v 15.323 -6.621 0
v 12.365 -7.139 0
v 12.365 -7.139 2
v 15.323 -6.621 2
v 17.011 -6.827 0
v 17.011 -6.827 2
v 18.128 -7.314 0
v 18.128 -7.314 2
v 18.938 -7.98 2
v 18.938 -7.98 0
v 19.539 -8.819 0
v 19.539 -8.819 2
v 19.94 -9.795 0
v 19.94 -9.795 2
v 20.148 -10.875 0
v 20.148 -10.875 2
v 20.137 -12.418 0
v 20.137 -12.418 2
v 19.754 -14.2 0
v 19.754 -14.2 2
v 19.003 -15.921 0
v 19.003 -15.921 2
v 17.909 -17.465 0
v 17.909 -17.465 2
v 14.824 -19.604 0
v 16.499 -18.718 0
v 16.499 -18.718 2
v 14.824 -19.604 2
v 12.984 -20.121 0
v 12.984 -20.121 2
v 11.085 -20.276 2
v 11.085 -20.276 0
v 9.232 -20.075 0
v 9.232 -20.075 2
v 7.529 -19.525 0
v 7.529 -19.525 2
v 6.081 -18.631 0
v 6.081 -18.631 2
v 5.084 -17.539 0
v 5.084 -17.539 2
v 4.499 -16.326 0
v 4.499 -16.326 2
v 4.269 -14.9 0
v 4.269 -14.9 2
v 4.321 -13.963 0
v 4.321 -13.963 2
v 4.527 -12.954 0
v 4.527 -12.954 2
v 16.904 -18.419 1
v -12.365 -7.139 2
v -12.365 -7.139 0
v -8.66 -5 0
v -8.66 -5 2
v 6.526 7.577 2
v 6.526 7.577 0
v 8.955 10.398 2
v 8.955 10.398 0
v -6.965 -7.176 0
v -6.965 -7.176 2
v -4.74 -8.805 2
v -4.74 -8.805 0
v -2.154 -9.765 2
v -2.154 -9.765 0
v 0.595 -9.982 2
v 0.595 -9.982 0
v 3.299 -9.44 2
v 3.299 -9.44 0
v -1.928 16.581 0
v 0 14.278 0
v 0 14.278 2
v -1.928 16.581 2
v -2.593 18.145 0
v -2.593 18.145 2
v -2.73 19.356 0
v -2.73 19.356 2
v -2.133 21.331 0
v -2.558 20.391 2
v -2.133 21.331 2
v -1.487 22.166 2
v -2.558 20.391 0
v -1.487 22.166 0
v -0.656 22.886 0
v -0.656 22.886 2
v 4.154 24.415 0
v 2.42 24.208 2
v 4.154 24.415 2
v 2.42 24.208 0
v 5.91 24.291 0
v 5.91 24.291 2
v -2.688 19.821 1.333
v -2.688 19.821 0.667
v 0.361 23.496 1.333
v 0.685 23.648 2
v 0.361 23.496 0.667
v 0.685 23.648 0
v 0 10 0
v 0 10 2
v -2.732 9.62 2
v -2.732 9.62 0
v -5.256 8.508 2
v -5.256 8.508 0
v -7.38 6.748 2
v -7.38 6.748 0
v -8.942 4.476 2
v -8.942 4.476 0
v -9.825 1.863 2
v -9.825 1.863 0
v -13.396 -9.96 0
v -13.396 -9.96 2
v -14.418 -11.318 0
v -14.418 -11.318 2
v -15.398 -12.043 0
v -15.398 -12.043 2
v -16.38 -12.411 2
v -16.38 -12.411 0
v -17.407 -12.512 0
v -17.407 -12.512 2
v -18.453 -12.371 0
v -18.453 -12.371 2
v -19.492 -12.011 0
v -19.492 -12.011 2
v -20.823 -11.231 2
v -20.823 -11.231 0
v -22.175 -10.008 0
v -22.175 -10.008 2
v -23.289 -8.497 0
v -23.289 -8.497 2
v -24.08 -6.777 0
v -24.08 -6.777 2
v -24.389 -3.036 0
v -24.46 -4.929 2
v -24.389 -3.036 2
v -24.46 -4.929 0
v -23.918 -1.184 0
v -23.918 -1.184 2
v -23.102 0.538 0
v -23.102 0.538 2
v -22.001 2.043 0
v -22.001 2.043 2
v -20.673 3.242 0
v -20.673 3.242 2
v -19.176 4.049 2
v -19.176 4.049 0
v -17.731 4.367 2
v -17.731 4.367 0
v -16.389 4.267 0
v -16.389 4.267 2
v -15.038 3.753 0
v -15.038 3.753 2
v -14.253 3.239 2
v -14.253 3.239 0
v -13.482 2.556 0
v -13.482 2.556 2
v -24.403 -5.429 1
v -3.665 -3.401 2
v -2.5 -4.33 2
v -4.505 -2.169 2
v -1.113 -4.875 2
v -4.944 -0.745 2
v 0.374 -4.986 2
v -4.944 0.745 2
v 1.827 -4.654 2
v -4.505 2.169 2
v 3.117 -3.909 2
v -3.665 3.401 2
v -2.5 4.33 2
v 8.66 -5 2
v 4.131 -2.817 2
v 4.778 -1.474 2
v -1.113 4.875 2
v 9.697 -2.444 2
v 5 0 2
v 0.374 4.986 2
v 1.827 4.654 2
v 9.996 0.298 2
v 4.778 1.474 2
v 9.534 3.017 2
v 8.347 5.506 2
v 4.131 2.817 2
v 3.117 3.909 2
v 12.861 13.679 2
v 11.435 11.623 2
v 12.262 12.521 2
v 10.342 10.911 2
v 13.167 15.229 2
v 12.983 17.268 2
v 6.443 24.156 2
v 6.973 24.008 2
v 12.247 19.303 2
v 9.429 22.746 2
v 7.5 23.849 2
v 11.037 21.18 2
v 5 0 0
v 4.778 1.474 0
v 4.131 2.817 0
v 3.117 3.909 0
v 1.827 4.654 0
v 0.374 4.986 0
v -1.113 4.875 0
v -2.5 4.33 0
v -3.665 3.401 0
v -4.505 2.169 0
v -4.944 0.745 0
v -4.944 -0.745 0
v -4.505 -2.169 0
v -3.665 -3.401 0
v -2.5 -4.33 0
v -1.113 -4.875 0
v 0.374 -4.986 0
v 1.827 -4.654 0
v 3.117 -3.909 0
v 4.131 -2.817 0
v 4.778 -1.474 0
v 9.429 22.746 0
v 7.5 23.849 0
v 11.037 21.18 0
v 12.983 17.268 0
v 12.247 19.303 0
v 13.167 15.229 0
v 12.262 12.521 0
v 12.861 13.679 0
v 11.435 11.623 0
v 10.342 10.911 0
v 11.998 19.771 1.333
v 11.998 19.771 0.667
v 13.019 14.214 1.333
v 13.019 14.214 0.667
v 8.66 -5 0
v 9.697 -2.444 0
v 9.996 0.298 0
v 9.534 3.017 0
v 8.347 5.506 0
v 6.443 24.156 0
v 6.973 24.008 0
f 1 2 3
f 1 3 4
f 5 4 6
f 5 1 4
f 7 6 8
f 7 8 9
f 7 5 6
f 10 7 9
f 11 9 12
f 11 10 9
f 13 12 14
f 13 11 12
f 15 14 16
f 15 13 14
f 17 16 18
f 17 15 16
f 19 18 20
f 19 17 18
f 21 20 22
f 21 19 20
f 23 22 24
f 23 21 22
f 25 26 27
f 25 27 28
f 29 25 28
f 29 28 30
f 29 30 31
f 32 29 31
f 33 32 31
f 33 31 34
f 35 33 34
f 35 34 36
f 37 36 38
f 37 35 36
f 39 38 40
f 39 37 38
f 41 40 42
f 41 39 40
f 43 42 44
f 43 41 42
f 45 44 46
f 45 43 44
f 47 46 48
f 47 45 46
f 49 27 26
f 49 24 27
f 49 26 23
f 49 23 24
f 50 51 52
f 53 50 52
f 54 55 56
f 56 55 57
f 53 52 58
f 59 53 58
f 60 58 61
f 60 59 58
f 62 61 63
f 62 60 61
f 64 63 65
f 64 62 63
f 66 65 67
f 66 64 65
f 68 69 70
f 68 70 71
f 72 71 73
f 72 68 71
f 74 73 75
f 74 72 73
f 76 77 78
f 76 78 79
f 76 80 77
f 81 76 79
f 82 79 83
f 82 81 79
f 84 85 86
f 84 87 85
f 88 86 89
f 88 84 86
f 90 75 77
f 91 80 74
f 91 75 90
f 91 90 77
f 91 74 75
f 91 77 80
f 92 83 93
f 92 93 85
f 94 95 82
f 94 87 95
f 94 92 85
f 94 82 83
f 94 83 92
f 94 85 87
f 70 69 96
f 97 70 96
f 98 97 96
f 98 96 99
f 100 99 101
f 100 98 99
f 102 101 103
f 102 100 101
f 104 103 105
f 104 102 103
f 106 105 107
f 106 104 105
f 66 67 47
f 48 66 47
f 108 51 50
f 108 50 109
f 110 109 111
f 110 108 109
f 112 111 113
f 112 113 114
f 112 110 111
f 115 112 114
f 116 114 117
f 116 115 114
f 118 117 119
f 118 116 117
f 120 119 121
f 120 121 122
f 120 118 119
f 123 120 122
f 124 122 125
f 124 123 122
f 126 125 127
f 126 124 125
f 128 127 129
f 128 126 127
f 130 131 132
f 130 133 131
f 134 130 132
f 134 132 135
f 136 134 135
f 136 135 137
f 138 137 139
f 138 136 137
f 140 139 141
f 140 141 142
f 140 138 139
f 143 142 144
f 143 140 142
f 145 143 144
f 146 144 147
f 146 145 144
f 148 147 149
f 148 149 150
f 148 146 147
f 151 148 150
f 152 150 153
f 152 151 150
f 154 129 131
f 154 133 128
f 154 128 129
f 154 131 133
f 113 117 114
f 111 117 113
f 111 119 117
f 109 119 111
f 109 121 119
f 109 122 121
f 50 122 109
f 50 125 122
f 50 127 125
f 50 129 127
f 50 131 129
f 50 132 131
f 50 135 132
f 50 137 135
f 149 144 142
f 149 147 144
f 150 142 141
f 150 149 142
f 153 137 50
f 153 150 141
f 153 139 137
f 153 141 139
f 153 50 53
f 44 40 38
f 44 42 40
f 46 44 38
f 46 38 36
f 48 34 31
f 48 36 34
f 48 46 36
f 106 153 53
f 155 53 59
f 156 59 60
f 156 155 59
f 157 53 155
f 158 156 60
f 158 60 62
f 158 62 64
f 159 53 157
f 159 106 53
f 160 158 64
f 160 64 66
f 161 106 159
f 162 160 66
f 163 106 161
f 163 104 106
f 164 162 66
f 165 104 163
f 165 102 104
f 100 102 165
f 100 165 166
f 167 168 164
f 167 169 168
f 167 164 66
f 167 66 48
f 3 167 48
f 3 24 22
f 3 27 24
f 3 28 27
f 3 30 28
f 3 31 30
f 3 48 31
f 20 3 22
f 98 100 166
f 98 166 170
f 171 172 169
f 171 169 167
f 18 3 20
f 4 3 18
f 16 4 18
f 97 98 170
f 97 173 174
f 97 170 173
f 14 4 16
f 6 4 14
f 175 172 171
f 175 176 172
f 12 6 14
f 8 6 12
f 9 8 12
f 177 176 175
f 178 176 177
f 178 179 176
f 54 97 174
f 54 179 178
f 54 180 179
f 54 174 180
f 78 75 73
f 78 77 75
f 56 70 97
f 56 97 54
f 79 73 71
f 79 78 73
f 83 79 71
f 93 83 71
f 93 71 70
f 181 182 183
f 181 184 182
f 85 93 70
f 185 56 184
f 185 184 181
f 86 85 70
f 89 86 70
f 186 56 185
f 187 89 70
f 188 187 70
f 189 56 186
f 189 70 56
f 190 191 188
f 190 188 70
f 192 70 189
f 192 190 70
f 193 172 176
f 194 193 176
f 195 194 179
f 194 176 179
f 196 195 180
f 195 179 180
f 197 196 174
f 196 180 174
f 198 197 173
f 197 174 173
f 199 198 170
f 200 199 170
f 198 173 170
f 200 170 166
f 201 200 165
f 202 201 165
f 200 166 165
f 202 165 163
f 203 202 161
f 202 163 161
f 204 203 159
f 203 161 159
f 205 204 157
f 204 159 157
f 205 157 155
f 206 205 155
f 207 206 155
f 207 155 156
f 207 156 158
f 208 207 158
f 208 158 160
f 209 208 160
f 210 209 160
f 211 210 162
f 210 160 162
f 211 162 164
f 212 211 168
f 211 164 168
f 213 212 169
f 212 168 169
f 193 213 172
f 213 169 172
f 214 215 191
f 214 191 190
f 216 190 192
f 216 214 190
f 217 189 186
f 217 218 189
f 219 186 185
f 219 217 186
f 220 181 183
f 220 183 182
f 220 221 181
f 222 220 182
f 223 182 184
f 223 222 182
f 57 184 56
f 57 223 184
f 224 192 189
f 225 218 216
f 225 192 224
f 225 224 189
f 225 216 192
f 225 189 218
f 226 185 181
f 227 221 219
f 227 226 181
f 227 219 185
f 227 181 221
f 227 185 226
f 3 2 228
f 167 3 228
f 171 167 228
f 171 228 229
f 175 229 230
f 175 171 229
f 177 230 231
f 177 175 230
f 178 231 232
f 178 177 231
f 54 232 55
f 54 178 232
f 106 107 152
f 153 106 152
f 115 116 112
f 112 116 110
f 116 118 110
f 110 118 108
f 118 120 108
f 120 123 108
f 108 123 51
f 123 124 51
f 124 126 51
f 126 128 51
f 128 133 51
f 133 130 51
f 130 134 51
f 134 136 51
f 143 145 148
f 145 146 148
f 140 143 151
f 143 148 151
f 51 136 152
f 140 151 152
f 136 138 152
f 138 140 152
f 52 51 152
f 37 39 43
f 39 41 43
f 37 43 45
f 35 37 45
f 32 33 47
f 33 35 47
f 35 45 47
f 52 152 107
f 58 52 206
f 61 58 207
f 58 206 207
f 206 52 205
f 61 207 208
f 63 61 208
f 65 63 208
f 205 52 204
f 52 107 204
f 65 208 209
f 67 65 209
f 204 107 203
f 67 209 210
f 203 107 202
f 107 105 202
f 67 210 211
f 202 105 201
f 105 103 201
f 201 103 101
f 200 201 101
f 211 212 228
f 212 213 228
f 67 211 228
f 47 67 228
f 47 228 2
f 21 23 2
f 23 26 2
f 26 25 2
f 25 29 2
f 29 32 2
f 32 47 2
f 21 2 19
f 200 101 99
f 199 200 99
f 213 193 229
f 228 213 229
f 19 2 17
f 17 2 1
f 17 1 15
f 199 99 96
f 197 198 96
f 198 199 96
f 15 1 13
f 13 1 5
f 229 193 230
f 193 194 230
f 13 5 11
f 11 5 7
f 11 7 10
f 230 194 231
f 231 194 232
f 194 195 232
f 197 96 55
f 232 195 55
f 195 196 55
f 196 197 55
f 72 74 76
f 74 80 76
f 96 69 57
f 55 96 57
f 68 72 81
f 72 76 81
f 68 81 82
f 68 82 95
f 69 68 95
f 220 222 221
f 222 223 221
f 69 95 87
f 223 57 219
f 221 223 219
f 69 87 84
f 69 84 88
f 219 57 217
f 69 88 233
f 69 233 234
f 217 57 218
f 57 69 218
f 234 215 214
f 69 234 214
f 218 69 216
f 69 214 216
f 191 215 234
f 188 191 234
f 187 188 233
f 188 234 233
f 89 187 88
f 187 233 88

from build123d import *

# Parameters (mm, degrees)
EXTRUDE_1_DEPTH     = 2
SKETCH_2_R          = 10
EXTRUDE_2_DEPTH     = 2
SKETCH_3_R          = 5
CUT_EXTRUDE_1_DEPTH = 2


with BuildPart() as part:
    # 草图1 → 凸台-拉伸1 (new body)
    with BuildSketch(Plane.XY):
        with BuildLine():
            Line((0, 14.278189945), (0, 5))
            ThreePointArc((0, 5), (-3.189255031, 3.850798923), (-4.912471936, 0.931460939))
            Line((-4.912471936, 0.931460939), (-13.482158936, 2.556371739))
            add(Edge.make_bspline(
                [(-12.365275213, -7.139094973), (-14.554153712, -16.794034), (-32.129621236, -6.762889891), (-18.674887245, 7.806911129), (-13.482158936, 2.556371739)],
                knots=[0, 0, 0, 0, 0.508066186, 1, 1, 1, 1], degree=3))
            Line((-12.365275213, -7.139094973), (-4.330127019, -2.5))
            ThreePointArc((-4.330127019, -2.5), (-1.740262177, -4.687375338), (1.649567132, -4.720055961))
            Line((1.649567132, -4.720055961), (4.527196601, -12.954078006))
            add(Edge.make_bspline(
                [(12.365275213, -7.139094973), (21.821136933, -4.207249845), (21.921645067, -24.443623258), (2.57646026, -20.076382332), (4.527196601, -12.954078006)],
                knots=[0, 0, 0, 0, 0.508066186, 1, 1, 1, 1], degree=3))
            Line((12.365275213, -7.139094973), (4.330127019, -2.5))
            ThreePointArc((4.330127019, -2.5), (4.929517208, 0.836576414), (3.262904804, 3.788595022))
            Line((3.262904804, 3.788595022), (8.954962335, 10.397706267))
            add(Edge.make_bspline(
                [(7.499565038, 23.84861682), (13.200715048, 21.585242478), (16.098426985, 12.269471203), (8.954962335, 10.397706267)],
                knots=[0.508066186, 0.508066186, 0.508066186, 0.508066186, 1, 1, 1, 1], degree=3))
            ThreePointArc((7.499565038, 23.84861682), (6.708252817, 24.083175541), (5.909629214, 24.291485804))
            add(Edge.make_bspline(
                [(0, 14.278189945), (-6.635591744, 20.417148167), (0.190529491, 25.273619091), (5.909629214, 24.291485804)],
                knots=[0, 0, 0, 0, 0.46392288, 0.46392288, 0.46392288, 0.46392288], degree=3))
        make_face()
    extrude(amount=EXTRUDE_1_DEPTH)

    # 草图2 → 凸台-拉伸2 (add)
    with BuildSketch(Plane.XY.offset(2)):
        Circle(SKETCH_2_R)
    extrude(amount=-EXTRUDE_2_DEPTH)

    # 草图3 → 切除-拉伸1 (cut)
    with BuildSketch(Plane.XY.offset(2)):
        Circle(SKETCH_3_R)
    extrude(amount=-CUT_EXTRUDE_1_DEPTH, mode=Mode.SUBTRACT)


solid = part.part
